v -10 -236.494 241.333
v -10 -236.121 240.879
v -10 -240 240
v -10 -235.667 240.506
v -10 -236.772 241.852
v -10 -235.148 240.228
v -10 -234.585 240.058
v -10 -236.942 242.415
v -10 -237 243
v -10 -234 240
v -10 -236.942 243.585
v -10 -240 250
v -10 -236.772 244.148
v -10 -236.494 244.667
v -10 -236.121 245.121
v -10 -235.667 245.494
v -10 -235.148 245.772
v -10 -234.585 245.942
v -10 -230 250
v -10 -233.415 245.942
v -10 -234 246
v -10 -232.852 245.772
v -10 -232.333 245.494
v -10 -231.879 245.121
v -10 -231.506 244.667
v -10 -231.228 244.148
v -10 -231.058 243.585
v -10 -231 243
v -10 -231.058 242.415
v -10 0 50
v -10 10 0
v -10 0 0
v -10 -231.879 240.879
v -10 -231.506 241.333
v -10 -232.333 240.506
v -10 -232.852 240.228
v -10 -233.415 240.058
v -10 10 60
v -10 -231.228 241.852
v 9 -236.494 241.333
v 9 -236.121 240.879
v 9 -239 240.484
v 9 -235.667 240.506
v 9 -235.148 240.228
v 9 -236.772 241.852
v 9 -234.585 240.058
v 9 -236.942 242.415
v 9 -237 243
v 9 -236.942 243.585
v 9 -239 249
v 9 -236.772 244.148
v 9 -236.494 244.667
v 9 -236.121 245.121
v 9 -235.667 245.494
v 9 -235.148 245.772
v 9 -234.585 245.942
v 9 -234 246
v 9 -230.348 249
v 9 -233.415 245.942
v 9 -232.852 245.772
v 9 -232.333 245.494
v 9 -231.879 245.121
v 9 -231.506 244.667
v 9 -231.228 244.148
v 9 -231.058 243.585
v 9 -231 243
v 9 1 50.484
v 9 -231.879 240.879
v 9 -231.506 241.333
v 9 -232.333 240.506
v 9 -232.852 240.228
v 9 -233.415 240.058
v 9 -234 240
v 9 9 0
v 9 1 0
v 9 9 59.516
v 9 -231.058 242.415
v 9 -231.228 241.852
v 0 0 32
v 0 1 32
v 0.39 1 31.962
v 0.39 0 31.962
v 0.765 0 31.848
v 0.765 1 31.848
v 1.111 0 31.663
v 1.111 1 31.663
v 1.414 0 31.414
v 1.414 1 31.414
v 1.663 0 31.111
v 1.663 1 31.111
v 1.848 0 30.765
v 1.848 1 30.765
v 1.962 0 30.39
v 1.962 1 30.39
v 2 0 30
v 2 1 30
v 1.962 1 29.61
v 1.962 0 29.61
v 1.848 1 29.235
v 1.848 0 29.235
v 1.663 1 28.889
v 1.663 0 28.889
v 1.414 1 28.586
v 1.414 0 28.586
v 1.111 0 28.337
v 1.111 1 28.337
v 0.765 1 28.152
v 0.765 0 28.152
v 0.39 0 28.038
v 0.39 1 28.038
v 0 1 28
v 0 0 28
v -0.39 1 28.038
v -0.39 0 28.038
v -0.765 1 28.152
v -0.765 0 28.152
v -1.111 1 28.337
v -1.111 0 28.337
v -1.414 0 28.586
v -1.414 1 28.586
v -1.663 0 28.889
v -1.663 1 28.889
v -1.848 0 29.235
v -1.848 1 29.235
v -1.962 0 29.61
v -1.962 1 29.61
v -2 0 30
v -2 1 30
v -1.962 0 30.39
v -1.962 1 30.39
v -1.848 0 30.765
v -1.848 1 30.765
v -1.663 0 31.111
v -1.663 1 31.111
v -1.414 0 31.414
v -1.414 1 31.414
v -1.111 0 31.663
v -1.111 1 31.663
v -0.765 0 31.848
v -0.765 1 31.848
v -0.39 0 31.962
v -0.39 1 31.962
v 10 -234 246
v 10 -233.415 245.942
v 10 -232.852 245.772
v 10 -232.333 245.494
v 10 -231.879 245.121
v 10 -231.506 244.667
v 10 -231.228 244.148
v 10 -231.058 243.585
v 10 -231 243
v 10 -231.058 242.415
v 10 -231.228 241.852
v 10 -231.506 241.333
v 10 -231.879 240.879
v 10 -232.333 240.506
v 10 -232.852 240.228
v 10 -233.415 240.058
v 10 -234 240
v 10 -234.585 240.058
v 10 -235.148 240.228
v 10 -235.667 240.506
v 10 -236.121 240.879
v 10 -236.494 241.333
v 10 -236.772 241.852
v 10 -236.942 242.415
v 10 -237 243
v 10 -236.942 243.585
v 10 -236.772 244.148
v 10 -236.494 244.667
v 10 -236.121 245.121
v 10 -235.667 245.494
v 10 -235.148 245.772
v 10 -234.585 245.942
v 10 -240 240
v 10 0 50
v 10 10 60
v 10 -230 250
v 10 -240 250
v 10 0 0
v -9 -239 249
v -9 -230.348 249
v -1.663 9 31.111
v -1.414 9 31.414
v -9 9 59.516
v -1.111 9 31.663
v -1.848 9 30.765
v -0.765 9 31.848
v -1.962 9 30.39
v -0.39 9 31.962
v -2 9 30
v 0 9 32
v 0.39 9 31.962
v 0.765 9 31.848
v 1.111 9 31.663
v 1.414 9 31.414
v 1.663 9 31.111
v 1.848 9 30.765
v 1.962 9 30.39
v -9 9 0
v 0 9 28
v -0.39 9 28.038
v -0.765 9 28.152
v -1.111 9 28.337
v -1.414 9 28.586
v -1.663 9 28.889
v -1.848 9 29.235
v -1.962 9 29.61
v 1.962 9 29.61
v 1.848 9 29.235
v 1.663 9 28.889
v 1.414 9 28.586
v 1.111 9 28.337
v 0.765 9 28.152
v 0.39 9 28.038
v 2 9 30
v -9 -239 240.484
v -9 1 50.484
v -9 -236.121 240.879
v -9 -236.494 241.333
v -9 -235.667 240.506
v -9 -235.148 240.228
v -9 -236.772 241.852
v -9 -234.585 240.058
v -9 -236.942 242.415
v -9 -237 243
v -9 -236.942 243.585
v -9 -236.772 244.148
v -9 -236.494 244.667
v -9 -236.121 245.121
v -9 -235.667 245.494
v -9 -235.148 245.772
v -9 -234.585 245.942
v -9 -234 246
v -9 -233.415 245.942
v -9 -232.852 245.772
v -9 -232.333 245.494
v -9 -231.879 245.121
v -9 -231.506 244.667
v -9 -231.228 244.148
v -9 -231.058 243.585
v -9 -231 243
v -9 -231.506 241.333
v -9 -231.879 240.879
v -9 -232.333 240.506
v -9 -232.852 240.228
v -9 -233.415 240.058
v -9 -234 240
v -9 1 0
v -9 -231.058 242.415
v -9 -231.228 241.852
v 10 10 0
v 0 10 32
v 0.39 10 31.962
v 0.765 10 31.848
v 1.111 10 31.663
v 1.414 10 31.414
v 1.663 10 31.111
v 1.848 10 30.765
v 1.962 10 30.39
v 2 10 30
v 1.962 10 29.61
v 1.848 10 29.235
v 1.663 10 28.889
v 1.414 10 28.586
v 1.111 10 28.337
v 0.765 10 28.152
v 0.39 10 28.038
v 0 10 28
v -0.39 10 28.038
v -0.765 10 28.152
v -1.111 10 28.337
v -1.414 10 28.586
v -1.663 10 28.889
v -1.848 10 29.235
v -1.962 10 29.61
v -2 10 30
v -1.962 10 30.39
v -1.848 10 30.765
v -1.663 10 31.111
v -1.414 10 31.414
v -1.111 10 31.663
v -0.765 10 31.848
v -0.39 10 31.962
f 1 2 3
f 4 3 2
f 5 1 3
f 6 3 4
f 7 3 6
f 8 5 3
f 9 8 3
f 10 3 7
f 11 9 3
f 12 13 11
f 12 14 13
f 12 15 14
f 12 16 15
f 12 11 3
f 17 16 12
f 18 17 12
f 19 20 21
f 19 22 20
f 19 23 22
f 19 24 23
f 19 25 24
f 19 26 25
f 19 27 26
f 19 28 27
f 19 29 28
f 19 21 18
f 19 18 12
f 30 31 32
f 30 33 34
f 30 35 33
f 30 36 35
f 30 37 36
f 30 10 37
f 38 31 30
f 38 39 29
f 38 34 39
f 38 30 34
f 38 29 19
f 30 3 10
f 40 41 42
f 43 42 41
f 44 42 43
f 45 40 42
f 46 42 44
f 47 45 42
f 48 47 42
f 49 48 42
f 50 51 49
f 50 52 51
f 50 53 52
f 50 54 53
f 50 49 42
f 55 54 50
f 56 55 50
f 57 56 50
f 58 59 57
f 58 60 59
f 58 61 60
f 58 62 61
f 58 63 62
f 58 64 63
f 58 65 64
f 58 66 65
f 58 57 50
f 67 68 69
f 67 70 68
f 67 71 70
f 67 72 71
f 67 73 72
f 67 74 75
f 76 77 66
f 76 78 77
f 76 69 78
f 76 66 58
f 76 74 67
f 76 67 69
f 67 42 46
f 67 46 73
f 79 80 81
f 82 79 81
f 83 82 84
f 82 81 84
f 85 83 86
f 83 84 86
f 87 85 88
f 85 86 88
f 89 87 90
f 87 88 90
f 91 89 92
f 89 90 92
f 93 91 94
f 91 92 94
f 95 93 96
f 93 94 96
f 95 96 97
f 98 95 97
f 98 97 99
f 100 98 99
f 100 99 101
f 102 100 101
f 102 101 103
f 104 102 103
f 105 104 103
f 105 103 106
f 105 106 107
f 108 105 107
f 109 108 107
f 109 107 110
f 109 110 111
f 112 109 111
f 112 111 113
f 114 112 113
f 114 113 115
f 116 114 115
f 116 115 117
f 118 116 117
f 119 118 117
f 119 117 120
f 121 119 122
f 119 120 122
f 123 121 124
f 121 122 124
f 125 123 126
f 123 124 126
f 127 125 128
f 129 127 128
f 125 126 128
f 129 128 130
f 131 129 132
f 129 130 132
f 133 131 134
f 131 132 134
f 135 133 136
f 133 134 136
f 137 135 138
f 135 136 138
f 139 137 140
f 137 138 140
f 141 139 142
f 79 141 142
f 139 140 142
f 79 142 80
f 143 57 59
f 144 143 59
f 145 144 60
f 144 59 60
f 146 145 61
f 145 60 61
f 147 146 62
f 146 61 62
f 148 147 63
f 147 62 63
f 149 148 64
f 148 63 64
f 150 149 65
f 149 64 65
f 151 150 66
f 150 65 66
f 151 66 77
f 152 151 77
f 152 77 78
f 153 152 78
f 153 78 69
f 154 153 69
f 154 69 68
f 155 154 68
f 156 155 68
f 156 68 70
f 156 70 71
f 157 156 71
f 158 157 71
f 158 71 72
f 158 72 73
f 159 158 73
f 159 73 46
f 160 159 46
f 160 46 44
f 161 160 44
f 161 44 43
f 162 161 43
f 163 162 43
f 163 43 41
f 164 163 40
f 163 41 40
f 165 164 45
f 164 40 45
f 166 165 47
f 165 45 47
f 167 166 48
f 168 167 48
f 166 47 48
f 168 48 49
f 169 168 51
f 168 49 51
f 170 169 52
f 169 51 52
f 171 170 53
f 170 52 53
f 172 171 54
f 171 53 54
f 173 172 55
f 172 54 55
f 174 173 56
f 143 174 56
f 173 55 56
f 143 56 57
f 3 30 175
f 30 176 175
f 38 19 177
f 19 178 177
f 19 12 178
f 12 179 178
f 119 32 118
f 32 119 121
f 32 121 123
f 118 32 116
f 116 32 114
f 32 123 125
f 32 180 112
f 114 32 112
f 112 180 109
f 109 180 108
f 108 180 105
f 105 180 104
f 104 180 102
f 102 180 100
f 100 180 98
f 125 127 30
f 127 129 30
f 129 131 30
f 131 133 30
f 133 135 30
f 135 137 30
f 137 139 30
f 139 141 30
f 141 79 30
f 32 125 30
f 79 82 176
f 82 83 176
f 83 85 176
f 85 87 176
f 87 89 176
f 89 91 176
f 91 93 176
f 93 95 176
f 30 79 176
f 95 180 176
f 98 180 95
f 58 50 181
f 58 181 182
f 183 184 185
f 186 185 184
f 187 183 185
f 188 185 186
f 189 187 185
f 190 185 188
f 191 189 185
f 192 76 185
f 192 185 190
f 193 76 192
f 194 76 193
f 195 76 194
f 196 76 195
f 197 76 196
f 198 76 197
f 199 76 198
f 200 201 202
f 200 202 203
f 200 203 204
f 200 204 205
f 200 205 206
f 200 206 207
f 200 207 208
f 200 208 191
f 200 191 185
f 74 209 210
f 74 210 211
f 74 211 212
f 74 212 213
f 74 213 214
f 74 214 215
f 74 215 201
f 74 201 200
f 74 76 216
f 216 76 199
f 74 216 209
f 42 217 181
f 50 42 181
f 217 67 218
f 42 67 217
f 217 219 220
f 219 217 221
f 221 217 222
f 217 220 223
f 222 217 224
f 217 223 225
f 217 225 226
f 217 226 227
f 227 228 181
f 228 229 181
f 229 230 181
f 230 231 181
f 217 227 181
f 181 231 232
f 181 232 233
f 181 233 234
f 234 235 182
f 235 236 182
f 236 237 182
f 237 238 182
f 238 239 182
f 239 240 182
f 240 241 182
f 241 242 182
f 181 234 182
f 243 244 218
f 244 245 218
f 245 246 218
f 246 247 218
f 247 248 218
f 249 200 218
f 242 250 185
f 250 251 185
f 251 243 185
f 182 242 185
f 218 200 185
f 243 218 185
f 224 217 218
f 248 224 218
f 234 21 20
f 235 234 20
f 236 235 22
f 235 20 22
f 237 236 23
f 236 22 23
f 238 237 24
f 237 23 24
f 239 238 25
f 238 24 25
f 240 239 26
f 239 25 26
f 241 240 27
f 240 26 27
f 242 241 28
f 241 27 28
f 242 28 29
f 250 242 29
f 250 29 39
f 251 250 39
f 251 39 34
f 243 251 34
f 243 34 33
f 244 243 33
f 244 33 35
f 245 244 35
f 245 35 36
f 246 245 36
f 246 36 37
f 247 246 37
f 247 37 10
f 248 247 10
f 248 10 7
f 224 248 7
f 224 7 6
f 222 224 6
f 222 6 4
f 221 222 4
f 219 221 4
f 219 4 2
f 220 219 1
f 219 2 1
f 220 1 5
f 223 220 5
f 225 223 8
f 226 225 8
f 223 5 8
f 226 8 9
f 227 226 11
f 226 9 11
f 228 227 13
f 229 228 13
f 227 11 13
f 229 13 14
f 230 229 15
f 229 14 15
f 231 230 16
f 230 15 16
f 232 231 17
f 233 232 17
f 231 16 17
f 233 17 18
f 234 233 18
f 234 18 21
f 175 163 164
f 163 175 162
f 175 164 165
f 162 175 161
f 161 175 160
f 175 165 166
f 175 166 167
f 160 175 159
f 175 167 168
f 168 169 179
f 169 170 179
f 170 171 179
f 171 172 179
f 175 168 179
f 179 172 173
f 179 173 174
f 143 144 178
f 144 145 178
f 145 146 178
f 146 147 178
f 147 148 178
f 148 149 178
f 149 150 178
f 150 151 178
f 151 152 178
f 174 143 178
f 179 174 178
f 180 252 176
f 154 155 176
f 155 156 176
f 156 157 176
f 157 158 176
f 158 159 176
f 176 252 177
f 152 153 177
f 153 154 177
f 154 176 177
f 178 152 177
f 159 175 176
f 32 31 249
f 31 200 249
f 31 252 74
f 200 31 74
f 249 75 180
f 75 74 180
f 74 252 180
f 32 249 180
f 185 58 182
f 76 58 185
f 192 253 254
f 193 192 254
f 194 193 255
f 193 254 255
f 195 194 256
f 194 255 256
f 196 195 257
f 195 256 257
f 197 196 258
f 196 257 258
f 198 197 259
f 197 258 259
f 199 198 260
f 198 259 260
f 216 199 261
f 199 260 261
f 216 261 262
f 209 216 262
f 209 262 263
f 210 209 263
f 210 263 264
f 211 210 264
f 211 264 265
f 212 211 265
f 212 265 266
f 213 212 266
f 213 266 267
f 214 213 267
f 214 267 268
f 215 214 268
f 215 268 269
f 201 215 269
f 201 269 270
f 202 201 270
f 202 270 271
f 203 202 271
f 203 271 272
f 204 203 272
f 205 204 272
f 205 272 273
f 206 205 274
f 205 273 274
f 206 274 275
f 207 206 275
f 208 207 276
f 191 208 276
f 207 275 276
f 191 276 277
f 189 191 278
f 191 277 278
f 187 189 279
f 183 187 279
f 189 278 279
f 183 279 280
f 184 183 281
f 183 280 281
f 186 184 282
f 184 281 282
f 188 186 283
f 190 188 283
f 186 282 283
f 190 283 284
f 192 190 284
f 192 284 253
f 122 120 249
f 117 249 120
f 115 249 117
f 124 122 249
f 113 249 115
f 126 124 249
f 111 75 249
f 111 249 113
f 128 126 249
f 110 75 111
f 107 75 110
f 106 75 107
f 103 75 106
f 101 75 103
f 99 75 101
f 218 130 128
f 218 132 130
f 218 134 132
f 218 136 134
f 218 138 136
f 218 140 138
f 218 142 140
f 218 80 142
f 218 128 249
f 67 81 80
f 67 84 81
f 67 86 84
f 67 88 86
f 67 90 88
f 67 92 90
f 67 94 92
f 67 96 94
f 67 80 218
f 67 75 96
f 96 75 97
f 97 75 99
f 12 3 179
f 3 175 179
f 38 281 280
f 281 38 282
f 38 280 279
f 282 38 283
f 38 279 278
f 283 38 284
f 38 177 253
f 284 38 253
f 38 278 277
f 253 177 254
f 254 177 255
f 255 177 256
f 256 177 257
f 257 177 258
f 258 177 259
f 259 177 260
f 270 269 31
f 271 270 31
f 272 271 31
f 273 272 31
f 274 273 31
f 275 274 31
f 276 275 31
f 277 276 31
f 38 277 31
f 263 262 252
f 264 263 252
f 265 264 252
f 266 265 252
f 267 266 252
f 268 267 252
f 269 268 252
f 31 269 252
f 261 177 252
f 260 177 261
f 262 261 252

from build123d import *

# Parameters (mm, degrees)
Y_KSEKLIK_EKSTR_ZYON1_DEPTH = 10
BO_ALTMA1_T                 = -1
IZIM2_R                     = 2
KES_EKSTR_ZYON1_DEPTH       = 27
IZIM3_R                     = 3
KES_EKSTR_ZYON2_DEPTH       = 37


with BuildPart() as part:
    # Çizim1 → Yükseklik-Ekstrüzyon1 (new, symmetric)
    with BuildSketch(Plane(origin=(0, 0, 0), x_dir=(0, 0, -1), z_dir=(1, 0, 0))):
        Polygon((0, 0), (-50, 0), (-240, -240), (-250, -240), (-250, -230), (-60, 10), (0, 10), align=None)
    extrude(amount=Y_KSEKLIK_EKSTR_ZYON1_DEPTH, both=True)

    # İç Boşaltma1
    bo_altma1_openings = [part.faces().sort_by_distance(p)[0] for p in [
        (0, 5, 0),
    ]]
    offset(amount=BO_ALTMA1_T, openings=bo_altma1_openings, kind=Kind.INTERSECTION)

    # Çizim2 → Kes-Ekstrüzyon1 (cut)
    with BuildSketch(Plane(origin=(0, 10, 0), x_dir=(1, 0, 0), z_dir=(0, 1, 0))):
        with Locations(Location((0, -30, 0), (0, 0, 270))):
            Circle(IZIM2_R)
    extrude(amount=-KES_EKSTR_ZYON1_DEPTH, mode=Mode.SUBTRACT)

    # Çizim3 → Kes-Ekstrüzyon2 (cut)
    with BuildSketch(Plane.ZY.offset(10)):
        with Locations((243, -234)):
            Circle(IZIM3_R)
    extrude(amount=-KES_EKSTR_ZYON2_DEPTH, mode=Mode.SUBTRACT)


solid = part.part
